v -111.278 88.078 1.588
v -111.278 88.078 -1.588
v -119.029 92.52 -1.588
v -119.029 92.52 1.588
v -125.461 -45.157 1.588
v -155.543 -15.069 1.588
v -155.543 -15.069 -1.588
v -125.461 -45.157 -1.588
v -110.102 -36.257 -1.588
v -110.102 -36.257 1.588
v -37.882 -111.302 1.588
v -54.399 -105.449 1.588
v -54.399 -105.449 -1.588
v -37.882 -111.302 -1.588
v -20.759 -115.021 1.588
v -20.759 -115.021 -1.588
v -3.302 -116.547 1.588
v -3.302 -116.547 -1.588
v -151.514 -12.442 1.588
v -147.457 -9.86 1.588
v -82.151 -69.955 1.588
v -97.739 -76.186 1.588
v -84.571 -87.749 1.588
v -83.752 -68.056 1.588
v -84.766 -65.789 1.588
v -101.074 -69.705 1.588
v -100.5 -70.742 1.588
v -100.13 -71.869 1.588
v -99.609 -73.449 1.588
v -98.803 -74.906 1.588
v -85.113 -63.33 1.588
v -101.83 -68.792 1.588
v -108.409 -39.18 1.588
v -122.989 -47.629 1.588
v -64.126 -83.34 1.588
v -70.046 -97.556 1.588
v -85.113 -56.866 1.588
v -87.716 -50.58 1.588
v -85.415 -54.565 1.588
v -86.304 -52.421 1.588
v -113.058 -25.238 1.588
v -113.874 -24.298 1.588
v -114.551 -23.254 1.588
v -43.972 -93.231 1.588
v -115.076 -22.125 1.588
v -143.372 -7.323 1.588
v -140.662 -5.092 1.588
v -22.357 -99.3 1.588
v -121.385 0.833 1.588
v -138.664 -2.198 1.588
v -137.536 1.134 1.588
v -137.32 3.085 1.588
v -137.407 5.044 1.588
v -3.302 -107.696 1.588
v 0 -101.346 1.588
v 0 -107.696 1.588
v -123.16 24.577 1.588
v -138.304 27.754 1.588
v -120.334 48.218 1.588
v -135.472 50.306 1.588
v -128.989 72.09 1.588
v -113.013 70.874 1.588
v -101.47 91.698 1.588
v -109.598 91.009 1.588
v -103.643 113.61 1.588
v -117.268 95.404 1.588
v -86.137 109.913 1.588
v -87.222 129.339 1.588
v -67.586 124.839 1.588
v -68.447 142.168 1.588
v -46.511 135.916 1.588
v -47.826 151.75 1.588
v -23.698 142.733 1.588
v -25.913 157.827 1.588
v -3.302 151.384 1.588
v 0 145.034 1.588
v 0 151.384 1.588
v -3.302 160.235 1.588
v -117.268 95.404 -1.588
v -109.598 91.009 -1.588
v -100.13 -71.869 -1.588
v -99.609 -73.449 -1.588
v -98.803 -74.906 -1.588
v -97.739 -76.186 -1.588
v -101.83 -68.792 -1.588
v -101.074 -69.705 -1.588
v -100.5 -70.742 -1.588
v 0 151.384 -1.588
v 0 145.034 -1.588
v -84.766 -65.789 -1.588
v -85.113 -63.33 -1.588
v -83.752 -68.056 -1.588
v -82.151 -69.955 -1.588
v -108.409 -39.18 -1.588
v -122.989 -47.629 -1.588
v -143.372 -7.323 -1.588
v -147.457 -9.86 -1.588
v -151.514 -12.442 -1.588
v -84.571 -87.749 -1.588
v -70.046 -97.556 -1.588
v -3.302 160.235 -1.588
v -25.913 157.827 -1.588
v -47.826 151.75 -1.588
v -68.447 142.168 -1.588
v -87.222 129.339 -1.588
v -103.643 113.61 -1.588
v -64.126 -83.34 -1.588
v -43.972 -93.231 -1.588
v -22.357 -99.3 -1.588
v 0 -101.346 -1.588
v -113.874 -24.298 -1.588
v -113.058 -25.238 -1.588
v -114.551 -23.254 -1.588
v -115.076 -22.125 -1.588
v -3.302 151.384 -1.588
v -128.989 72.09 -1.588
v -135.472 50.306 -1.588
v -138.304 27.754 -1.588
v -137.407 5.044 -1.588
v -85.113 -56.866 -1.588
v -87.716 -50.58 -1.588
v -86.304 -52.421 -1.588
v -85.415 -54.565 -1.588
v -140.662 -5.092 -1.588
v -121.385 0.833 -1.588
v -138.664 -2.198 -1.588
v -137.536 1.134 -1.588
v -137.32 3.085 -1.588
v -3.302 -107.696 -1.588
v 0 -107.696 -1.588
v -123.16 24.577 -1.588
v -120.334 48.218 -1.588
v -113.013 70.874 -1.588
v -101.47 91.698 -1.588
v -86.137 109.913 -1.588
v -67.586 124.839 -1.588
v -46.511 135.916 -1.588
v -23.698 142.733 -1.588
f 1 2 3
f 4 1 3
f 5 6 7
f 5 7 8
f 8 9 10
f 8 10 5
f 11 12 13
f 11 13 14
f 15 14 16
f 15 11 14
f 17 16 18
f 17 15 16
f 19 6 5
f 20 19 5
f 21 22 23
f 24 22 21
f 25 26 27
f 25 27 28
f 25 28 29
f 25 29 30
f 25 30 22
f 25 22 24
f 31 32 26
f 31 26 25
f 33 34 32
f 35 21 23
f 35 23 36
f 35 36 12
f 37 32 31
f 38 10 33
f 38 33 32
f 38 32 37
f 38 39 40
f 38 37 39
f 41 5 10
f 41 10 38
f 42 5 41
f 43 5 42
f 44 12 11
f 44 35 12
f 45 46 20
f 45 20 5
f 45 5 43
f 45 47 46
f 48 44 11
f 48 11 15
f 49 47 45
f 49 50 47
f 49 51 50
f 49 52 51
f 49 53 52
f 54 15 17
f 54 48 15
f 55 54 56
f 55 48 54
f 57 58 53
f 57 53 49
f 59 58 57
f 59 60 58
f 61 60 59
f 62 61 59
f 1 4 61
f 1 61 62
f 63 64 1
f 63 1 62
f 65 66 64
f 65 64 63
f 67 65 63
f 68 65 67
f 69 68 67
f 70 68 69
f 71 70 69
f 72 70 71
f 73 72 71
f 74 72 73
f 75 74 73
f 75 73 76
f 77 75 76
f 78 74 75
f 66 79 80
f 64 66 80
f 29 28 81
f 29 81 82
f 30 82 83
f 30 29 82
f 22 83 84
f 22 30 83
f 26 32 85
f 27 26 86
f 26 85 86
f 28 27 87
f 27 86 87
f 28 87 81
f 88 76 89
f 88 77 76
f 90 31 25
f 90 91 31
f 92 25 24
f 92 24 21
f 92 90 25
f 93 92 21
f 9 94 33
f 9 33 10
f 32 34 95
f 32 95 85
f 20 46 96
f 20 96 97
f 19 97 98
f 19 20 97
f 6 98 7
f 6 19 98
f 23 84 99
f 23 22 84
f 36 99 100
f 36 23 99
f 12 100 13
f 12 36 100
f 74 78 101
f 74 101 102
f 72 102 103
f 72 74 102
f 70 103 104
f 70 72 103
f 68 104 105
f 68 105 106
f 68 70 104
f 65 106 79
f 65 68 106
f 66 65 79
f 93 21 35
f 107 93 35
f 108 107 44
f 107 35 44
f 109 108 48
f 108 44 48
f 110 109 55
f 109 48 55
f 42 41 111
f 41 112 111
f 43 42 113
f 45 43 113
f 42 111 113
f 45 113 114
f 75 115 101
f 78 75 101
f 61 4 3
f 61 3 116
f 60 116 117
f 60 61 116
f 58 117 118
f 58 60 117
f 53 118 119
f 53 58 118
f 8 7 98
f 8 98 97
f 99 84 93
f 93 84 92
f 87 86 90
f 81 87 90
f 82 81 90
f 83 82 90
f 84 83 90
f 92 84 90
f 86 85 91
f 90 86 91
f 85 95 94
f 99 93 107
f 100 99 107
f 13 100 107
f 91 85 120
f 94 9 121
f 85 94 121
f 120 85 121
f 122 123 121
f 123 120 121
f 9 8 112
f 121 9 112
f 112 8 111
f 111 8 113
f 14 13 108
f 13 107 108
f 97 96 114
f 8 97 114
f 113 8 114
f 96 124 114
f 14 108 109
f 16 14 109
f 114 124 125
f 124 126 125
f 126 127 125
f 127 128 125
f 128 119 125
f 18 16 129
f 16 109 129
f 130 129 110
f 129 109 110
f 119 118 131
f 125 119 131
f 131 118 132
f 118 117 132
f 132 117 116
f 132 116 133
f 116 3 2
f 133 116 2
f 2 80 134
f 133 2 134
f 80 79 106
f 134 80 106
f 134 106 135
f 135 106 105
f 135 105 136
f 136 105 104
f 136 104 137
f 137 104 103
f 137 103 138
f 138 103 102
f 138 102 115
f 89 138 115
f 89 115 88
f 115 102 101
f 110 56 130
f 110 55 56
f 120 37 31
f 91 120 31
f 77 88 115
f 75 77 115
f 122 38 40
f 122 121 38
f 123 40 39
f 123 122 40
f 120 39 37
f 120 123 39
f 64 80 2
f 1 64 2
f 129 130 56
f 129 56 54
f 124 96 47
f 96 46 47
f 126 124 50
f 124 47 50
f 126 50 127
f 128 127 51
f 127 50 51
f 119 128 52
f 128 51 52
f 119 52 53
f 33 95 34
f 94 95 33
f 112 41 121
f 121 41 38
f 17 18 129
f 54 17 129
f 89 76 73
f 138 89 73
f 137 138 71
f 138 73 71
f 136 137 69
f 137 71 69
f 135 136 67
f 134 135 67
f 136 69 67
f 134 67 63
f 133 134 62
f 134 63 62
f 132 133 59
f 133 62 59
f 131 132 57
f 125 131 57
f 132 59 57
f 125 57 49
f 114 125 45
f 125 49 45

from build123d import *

# Parameters (mm, degrees)
BOSS_EXTRUDE1_DEPTH = 1.5875
CUT_EXTRUDE1_DEPTH  = 3.175
FILLET1_R           = 8.89
SKETCH4_W           = 218.524279389
SKETCH4_H           = 440.65456999
CUT_EXTRUDE3_DEPTH  = 139.43
BOSS_EXTRUDE2_DEPTH = 1.5875
FILLET2_R           = 12.7
FILLET3_R           = 6.35
SKETCH6_W           = 3.302
SKETCH6_H           = 12.7
CUT_EXTRUDE4_DEPTH  = 4.1750001


with BuildPart() as part:
    # Sketch1 → Boss-Extrude1 (new body, symmetric)
    with BuildSketch(Plane.XY):
        with BuildLine():
            Line((-127.293308919, -32.555250036), (-100.352540556, -59.496018399))
            Line((-100.352540556, -59.496018399), (-100.352540556, -73.509198709))
            ThreePointArc((-100.352540556, -73.509198709), (-79.006783461, -91.825666433), (-54.399250036, -105.449308919))
            ThreePointArc((-54.399250036, -105.449308919), (97.88479172, 119.72879172), (-127.293308919, -32.555250036))
        make_face()
    extrude(amount=BOSS_EXTRUDE1_DEPTH, both=True)

    # Sketch2 → Cut-Extrude1 (cut)
    with BuildSketch(Plane.XY.offset(1.5875)):
        with BuildLine():
            Line((-114.372852664, -23.923091601), (-85.112540556, -53.183403709))
            Line((-85.112540556, -53.183403709), (-85.112540556, -67.215707726))
            ThreePointArc((-85.112540556, -67.215707726), (102.064529488, 90.826663911), (-114.372852664, -23.923091601))
        make_face()
    extrude(amount=-CUT_EXTRUDE1_DEPTH, mode=Mode.SUBTRACT)

    # Fillet1
    fillet1_edges = [part.edges().sort_by_distance(p)[0] for p in [
        (-114.372852664, -23.923091601, 0),
        (-85.112540556, -67.215707726, 0),
        (-85.112540556, -53.183403709, 0),
        (-100.352540556, -73.509198709, -0.79375),
        (-100.352540556, -59.496018399, -0.79375),
        (-127.293308919, -32.555250036, -0.79375),
    ]]
    fillet(fillet1_edges, radius=FILLET1_R)

    # Sketch4 → Cut-Extrude3 (cut, through all)
    with BuildSketch(Plane(origin=(0, 0, 0), x_dir=(0, 0, -1), z_dir=(1, 0, 0))):
        with Locations((12.98164036, 12.468370851)):
            Rectangle(SKETCH4_W, SKETCH4_H)
    extrude(amount=CUT_EXTRUDE3_DEPTH, mode=Mode.SUBTRACT)

    # Sketch5 → Boss-Extrude2 (add, symmetric)
    with BuildSketch(Plane.XY):
        with BuildLine():
            Line((-100.344096462, -70.2778643), (-93.131982579, -63.067144592))
            Line((-93.131982579, -63.067144592), (-135.386236526, -2.54))
            ThreePointArc((-135.386236526, -2.54), (-145.549369809, -8.667691803), (-155.542666772, -15.068621483))
            Line((-155.542666772, -15.068621483), (-100.344096462, -70.2778643))
        make_face()
    extrude(amount=BOSS_EXTRUDE2_DEPTH, both=True)

    # Fillet2
    fillet2_edges = [part.edges().sort_by_distance(p)[0] for p in [
        (-136.181300165, -3.005917211, 0),
    ]]
    fillet(fillet2_edges, radius=FILLET2_R)

    # Fillet3
    fillet3_edges = [part.edges().sort_by_distance(p)[0] for p in [
        (-100.344096462, -70.2778643, -0.79375),
    ]]
    fillet(fillet3_edges, radius=FILLET3_R)

    # Sketch6 → Cut-Extrude4 (cut, through all)
    with BuildSketch(Plane(origin=(0, 0, -1.5875), x_dir=(-1, 0, 0), z_dir=(0, 0, -1))):
        with Locations((1.651, 157.734)):
            Rectangle(SKETCH6_W, SKETCH6_H)
        Polygon((109.598496198, 91.009030044), (111.278220029, 88.078029687), (122.297018363, 94.392780931), (120.617294532, 97.323781288), align=None)
        Polygon((108.408719805, -39.179754441), (110.102498062, -36.256853407), (126.58502269, -45.808234558), (124.891244433, -48.731135592), align=None)
        with Locations((1.651, -114.046)):
            Rectangle(SKETCH6_W, SKETCH6_H)
    extrude(amount=-CUT_EXTRUDE4_DEPTH, mode=Mode.SUBTRACT)


solid = part.part
